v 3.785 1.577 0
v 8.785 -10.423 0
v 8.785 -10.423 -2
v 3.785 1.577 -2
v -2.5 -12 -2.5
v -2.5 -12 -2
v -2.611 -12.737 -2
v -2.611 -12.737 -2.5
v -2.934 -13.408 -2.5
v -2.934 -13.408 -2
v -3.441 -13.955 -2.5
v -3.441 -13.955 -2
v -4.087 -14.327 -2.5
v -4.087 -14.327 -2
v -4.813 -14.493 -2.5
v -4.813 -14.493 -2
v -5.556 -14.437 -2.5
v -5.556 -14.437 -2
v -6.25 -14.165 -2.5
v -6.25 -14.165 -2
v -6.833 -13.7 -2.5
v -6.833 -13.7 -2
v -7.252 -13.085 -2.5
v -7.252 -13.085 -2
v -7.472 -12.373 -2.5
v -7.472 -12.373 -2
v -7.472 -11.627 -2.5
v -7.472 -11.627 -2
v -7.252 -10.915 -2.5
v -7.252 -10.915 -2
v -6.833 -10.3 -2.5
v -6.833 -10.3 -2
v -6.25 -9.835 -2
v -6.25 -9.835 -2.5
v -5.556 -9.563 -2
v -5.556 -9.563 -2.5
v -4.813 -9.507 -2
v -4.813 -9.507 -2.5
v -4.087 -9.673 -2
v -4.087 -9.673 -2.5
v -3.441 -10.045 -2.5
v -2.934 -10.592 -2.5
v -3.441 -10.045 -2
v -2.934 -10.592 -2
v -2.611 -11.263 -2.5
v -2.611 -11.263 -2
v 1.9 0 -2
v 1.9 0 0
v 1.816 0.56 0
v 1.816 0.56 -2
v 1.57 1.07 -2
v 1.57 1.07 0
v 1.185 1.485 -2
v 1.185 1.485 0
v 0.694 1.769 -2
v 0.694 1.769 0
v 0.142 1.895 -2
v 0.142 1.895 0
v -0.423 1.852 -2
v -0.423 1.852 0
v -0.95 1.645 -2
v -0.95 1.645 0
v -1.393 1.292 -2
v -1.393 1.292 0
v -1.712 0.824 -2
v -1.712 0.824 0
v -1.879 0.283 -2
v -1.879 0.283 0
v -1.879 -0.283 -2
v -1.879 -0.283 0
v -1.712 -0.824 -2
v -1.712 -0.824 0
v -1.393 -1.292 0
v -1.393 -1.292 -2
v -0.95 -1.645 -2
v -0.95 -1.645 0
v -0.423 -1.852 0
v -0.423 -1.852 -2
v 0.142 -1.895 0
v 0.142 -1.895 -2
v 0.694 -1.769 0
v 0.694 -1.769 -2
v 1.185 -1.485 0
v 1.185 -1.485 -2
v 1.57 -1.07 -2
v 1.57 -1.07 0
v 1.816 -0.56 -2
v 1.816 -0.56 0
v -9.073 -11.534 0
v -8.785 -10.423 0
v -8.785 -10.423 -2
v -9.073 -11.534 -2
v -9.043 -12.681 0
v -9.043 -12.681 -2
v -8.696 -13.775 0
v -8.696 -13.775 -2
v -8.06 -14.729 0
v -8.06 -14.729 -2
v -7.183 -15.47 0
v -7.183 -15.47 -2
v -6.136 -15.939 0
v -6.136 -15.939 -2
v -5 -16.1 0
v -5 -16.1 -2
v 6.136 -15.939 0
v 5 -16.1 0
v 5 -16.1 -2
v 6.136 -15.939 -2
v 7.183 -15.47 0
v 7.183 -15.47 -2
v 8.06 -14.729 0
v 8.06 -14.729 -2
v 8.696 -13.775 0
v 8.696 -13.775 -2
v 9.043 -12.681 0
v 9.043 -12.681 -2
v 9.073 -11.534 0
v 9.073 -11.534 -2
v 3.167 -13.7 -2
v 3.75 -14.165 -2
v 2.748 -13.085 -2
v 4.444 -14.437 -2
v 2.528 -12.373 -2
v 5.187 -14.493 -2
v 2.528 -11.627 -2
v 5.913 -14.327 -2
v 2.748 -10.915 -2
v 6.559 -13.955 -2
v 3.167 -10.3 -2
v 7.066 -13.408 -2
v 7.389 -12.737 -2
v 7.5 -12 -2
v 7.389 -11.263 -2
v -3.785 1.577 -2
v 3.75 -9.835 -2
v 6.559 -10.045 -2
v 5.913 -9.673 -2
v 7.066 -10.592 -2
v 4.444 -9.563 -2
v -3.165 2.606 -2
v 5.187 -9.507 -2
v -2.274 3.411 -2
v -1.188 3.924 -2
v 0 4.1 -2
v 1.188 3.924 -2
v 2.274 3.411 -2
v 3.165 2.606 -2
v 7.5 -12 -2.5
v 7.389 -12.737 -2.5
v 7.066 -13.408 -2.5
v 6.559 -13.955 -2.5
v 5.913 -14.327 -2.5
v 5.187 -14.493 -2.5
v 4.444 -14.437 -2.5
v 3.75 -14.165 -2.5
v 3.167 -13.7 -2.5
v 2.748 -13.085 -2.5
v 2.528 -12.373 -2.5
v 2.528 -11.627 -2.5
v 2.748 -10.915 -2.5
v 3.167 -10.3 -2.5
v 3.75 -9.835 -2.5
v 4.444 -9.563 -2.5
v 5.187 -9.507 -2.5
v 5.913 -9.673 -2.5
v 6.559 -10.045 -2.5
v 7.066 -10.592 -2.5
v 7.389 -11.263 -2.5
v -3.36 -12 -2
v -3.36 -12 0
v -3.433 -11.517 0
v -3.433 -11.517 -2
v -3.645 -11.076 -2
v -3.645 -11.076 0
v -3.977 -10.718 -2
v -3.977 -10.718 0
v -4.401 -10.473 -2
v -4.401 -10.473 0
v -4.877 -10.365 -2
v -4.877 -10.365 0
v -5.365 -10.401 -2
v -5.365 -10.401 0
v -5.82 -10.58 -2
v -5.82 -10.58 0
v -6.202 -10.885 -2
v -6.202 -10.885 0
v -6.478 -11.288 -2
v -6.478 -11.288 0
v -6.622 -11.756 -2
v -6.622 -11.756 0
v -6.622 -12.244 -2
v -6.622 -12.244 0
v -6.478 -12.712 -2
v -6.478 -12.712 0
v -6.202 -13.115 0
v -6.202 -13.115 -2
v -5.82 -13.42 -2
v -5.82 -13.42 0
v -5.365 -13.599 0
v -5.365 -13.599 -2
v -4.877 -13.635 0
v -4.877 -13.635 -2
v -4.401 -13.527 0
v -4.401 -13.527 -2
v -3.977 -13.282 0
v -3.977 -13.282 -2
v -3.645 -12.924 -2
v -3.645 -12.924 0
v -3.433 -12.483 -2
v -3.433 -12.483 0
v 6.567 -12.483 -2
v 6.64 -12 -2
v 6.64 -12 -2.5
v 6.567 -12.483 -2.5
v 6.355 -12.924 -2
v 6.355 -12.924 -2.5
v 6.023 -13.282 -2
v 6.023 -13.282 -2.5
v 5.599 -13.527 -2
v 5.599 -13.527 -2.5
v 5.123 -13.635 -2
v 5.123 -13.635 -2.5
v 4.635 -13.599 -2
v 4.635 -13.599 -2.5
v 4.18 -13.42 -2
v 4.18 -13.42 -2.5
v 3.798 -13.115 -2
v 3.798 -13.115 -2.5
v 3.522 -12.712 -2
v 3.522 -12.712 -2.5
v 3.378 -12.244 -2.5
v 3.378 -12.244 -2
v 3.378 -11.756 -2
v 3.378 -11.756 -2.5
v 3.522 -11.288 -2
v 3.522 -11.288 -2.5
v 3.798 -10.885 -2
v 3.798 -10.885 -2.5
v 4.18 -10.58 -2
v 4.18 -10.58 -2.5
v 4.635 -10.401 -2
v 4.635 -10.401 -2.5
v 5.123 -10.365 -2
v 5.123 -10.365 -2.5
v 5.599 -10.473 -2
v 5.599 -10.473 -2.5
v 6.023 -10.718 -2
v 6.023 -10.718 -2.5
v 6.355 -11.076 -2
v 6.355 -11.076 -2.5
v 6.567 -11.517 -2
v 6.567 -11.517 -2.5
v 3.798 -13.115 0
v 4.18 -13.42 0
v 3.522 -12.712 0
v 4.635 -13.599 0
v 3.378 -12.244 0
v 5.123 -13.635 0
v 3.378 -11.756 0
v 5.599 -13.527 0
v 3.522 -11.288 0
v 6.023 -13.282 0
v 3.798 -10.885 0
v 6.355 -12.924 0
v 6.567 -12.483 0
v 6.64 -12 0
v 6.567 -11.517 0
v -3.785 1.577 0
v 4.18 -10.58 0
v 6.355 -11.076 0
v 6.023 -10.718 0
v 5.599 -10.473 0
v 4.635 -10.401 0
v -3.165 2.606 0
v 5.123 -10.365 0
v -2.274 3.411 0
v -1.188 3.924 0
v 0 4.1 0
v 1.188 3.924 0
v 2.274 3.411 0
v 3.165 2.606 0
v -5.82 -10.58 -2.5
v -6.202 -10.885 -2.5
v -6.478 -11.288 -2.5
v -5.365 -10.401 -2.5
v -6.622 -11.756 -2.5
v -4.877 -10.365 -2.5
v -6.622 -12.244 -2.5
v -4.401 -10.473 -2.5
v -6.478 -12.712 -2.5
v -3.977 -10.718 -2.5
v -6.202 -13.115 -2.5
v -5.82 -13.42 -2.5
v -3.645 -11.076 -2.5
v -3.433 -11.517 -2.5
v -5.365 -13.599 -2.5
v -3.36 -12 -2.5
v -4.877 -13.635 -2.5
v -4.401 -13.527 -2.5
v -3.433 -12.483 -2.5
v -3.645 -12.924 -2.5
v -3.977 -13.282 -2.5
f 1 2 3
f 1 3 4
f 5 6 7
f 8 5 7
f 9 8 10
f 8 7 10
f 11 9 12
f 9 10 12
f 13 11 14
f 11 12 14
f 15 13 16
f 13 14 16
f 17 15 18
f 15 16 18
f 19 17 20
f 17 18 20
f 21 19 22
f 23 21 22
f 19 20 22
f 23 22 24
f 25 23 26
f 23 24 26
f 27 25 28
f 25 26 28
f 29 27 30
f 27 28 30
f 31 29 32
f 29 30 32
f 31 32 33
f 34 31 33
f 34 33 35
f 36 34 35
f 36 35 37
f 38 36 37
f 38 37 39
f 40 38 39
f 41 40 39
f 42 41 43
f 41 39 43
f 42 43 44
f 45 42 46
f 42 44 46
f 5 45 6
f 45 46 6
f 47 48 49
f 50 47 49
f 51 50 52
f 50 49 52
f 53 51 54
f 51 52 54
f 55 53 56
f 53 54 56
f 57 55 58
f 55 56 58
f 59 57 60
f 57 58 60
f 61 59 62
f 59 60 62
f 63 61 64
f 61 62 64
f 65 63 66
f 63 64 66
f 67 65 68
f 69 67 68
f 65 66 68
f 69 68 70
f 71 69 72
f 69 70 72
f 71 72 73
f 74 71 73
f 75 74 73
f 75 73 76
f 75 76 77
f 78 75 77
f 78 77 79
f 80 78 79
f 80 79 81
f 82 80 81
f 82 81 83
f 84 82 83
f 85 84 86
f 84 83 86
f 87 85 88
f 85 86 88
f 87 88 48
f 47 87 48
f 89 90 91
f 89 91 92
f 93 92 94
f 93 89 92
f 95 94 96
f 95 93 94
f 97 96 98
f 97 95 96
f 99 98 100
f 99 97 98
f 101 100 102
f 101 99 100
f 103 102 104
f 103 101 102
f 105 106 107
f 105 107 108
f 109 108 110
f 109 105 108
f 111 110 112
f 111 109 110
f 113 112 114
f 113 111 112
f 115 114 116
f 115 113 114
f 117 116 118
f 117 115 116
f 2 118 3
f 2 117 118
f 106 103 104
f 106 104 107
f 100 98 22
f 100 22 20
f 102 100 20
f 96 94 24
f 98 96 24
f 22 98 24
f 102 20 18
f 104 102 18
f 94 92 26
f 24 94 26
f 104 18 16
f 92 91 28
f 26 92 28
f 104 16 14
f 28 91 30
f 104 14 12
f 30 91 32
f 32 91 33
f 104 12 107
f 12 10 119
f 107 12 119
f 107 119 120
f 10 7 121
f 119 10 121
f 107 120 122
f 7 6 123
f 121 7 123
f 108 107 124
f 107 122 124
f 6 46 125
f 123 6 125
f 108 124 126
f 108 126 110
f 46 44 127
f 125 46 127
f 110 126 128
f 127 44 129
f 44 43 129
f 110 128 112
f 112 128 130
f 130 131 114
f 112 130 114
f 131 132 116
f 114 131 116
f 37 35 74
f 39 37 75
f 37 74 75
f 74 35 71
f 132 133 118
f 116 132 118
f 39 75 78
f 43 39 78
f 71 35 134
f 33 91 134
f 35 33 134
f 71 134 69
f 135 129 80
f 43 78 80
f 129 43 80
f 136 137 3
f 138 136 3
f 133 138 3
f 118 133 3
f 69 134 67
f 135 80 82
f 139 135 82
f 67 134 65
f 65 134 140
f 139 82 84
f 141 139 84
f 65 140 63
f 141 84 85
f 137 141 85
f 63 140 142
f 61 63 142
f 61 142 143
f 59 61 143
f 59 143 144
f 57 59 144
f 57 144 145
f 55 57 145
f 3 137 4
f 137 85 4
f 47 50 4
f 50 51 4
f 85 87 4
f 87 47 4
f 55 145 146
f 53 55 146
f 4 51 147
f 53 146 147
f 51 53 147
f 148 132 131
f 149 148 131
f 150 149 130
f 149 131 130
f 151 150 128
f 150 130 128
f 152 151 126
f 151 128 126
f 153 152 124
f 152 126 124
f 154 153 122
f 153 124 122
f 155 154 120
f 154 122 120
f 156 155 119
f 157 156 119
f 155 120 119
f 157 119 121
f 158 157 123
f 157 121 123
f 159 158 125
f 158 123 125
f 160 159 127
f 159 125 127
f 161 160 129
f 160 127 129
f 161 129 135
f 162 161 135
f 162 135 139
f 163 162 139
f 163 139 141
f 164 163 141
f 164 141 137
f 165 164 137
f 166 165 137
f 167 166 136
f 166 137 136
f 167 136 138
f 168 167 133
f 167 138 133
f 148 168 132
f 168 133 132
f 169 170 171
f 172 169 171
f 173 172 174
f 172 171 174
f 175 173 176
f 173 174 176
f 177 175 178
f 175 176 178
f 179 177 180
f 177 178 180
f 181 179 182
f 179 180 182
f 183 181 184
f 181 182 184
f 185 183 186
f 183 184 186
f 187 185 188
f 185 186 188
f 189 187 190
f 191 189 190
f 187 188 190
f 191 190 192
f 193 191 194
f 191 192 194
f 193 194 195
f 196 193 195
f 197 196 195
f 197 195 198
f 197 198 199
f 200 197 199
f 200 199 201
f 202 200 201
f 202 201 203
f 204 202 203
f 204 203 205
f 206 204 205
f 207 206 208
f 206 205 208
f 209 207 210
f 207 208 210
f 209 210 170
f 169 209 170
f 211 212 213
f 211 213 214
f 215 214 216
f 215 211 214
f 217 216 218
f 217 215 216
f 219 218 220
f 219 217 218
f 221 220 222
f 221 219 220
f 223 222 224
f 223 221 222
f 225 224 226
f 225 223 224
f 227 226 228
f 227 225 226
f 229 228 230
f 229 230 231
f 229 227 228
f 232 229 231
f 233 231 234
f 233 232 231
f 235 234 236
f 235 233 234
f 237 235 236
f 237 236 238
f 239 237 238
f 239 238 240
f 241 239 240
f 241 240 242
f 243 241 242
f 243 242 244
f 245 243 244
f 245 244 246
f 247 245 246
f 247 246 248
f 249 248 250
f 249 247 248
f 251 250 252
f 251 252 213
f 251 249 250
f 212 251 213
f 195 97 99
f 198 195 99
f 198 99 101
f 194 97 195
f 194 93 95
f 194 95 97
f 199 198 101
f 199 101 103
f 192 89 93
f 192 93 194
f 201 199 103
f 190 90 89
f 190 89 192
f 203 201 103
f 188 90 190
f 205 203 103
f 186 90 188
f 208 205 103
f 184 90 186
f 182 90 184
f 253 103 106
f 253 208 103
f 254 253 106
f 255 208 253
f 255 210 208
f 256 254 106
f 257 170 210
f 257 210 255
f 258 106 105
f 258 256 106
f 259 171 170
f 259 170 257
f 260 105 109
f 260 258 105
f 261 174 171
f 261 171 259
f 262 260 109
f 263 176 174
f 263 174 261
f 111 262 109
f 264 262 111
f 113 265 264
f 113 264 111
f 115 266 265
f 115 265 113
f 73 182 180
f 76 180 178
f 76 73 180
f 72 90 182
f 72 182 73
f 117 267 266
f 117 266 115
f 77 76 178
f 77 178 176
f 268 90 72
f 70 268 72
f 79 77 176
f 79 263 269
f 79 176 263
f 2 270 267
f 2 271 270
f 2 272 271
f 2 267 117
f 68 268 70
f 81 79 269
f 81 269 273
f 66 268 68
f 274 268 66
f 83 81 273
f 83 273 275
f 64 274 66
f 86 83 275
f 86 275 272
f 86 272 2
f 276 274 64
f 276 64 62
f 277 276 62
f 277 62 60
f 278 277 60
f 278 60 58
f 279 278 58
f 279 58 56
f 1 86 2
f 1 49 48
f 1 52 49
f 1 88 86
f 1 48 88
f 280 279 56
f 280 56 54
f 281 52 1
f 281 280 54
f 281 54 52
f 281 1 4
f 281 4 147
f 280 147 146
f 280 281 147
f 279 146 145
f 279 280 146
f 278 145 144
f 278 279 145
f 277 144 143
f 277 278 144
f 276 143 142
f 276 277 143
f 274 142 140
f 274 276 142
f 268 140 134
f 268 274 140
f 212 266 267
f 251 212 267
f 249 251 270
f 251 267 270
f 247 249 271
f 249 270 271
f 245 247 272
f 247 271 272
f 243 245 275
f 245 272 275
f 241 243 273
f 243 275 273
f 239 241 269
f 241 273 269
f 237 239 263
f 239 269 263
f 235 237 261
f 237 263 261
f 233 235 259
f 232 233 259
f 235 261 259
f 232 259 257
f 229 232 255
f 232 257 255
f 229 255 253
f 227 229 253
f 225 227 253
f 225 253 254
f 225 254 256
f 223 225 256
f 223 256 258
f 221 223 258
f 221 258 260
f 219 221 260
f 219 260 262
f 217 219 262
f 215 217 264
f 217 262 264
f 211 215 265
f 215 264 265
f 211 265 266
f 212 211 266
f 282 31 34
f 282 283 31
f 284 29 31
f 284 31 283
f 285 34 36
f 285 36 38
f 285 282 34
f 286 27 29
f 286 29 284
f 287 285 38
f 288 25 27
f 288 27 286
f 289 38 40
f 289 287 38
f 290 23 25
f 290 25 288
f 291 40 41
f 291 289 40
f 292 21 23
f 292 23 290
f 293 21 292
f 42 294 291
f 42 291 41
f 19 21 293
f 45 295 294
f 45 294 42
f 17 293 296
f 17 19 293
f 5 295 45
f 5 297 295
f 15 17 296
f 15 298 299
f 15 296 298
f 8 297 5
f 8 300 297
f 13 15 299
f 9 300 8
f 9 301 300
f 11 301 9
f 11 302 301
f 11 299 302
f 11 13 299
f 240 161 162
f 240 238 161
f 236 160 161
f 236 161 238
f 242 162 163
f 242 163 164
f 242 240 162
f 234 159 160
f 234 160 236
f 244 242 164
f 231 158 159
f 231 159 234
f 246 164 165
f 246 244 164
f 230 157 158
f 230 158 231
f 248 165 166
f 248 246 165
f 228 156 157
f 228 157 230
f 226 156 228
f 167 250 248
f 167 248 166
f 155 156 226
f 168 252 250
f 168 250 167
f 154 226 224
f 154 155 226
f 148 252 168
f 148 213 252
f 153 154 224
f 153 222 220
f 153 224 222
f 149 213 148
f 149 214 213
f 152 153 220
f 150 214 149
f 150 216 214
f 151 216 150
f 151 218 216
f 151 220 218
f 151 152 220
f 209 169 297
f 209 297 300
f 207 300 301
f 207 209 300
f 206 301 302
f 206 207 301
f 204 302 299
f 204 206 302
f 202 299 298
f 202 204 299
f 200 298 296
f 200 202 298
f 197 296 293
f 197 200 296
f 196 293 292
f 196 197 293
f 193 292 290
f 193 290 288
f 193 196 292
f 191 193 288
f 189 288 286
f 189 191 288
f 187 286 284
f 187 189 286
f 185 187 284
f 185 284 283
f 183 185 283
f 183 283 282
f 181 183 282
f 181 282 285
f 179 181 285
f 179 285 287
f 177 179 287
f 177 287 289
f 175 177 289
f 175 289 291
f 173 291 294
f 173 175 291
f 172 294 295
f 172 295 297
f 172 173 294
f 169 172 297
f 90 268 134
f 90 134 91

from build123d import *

# Parameters (mm, degrees)
SKETCH_R      = 1.64
SKETCH_R_2    = 1.9
PAD_DEPTH     = 2
SKETCH001_R   = 2.5
SKETCH001_R_2 = 1.64
PAD001_DEPTH  = 0.5


with BuildPart() as part:
    # Sketch → Pad (new body)
    with BuildSketch(Plane.XY):
        with BuildLine():
            ThreePointArc((3.784615, 1.576923), (0, 4.1), (-3.784615, 1.576923))
            Line((-3.784615, 1.576923), (-8.784615, -10.423077))
            ThreePointArc((-8.784615, -10.423077), (-8.41141, -14.274265), (-5.000015, -16.1))
            Line((-5.000015, -16.1), (5, -16.1))
            ThreePointArc((5, -16.1), (8.411406, -14.274271), (8.784615, -10.423077))
            Line((8.784615, -10.423077), (3.784615, 1.576923))
        make_face()
        with Locations((-5, -12)):
            Circle(SKETCH_R, mode=Mode.SUBTRACT)
        with Locations((5, -12)):
            Circle(SKETCH_R, mode=Mode.SUBTRACT)
        Circle(SKETCH_R_2, mode=Mode.SUBTRACT)
    extrude(amount=-PAD_DEPTH)

    # Sketch001 (on Face11 of Pad) → Pad001 (join)
    with BuildSketch(Plane(origin=(0, 0, -2), x_dir=(1, 0, 0), z_dir=(0, 0, -1))):
        with Locations((-5, 12)):
            Circle(SKETCH001_R)
        with Locations((-5, 12)):
            Circle(SKETCH001_R_2, mode=Mode.SUBTRACT)
        with Locations((5, 12)):
            Circle(SKETCH001_R)
        with Locations((5, 12)):
            Circle(SKETCH001_R_2, mode=Mode.SUBTRACT)
    extrude(amount=PAD001_DEPTH)


solid = part.part
